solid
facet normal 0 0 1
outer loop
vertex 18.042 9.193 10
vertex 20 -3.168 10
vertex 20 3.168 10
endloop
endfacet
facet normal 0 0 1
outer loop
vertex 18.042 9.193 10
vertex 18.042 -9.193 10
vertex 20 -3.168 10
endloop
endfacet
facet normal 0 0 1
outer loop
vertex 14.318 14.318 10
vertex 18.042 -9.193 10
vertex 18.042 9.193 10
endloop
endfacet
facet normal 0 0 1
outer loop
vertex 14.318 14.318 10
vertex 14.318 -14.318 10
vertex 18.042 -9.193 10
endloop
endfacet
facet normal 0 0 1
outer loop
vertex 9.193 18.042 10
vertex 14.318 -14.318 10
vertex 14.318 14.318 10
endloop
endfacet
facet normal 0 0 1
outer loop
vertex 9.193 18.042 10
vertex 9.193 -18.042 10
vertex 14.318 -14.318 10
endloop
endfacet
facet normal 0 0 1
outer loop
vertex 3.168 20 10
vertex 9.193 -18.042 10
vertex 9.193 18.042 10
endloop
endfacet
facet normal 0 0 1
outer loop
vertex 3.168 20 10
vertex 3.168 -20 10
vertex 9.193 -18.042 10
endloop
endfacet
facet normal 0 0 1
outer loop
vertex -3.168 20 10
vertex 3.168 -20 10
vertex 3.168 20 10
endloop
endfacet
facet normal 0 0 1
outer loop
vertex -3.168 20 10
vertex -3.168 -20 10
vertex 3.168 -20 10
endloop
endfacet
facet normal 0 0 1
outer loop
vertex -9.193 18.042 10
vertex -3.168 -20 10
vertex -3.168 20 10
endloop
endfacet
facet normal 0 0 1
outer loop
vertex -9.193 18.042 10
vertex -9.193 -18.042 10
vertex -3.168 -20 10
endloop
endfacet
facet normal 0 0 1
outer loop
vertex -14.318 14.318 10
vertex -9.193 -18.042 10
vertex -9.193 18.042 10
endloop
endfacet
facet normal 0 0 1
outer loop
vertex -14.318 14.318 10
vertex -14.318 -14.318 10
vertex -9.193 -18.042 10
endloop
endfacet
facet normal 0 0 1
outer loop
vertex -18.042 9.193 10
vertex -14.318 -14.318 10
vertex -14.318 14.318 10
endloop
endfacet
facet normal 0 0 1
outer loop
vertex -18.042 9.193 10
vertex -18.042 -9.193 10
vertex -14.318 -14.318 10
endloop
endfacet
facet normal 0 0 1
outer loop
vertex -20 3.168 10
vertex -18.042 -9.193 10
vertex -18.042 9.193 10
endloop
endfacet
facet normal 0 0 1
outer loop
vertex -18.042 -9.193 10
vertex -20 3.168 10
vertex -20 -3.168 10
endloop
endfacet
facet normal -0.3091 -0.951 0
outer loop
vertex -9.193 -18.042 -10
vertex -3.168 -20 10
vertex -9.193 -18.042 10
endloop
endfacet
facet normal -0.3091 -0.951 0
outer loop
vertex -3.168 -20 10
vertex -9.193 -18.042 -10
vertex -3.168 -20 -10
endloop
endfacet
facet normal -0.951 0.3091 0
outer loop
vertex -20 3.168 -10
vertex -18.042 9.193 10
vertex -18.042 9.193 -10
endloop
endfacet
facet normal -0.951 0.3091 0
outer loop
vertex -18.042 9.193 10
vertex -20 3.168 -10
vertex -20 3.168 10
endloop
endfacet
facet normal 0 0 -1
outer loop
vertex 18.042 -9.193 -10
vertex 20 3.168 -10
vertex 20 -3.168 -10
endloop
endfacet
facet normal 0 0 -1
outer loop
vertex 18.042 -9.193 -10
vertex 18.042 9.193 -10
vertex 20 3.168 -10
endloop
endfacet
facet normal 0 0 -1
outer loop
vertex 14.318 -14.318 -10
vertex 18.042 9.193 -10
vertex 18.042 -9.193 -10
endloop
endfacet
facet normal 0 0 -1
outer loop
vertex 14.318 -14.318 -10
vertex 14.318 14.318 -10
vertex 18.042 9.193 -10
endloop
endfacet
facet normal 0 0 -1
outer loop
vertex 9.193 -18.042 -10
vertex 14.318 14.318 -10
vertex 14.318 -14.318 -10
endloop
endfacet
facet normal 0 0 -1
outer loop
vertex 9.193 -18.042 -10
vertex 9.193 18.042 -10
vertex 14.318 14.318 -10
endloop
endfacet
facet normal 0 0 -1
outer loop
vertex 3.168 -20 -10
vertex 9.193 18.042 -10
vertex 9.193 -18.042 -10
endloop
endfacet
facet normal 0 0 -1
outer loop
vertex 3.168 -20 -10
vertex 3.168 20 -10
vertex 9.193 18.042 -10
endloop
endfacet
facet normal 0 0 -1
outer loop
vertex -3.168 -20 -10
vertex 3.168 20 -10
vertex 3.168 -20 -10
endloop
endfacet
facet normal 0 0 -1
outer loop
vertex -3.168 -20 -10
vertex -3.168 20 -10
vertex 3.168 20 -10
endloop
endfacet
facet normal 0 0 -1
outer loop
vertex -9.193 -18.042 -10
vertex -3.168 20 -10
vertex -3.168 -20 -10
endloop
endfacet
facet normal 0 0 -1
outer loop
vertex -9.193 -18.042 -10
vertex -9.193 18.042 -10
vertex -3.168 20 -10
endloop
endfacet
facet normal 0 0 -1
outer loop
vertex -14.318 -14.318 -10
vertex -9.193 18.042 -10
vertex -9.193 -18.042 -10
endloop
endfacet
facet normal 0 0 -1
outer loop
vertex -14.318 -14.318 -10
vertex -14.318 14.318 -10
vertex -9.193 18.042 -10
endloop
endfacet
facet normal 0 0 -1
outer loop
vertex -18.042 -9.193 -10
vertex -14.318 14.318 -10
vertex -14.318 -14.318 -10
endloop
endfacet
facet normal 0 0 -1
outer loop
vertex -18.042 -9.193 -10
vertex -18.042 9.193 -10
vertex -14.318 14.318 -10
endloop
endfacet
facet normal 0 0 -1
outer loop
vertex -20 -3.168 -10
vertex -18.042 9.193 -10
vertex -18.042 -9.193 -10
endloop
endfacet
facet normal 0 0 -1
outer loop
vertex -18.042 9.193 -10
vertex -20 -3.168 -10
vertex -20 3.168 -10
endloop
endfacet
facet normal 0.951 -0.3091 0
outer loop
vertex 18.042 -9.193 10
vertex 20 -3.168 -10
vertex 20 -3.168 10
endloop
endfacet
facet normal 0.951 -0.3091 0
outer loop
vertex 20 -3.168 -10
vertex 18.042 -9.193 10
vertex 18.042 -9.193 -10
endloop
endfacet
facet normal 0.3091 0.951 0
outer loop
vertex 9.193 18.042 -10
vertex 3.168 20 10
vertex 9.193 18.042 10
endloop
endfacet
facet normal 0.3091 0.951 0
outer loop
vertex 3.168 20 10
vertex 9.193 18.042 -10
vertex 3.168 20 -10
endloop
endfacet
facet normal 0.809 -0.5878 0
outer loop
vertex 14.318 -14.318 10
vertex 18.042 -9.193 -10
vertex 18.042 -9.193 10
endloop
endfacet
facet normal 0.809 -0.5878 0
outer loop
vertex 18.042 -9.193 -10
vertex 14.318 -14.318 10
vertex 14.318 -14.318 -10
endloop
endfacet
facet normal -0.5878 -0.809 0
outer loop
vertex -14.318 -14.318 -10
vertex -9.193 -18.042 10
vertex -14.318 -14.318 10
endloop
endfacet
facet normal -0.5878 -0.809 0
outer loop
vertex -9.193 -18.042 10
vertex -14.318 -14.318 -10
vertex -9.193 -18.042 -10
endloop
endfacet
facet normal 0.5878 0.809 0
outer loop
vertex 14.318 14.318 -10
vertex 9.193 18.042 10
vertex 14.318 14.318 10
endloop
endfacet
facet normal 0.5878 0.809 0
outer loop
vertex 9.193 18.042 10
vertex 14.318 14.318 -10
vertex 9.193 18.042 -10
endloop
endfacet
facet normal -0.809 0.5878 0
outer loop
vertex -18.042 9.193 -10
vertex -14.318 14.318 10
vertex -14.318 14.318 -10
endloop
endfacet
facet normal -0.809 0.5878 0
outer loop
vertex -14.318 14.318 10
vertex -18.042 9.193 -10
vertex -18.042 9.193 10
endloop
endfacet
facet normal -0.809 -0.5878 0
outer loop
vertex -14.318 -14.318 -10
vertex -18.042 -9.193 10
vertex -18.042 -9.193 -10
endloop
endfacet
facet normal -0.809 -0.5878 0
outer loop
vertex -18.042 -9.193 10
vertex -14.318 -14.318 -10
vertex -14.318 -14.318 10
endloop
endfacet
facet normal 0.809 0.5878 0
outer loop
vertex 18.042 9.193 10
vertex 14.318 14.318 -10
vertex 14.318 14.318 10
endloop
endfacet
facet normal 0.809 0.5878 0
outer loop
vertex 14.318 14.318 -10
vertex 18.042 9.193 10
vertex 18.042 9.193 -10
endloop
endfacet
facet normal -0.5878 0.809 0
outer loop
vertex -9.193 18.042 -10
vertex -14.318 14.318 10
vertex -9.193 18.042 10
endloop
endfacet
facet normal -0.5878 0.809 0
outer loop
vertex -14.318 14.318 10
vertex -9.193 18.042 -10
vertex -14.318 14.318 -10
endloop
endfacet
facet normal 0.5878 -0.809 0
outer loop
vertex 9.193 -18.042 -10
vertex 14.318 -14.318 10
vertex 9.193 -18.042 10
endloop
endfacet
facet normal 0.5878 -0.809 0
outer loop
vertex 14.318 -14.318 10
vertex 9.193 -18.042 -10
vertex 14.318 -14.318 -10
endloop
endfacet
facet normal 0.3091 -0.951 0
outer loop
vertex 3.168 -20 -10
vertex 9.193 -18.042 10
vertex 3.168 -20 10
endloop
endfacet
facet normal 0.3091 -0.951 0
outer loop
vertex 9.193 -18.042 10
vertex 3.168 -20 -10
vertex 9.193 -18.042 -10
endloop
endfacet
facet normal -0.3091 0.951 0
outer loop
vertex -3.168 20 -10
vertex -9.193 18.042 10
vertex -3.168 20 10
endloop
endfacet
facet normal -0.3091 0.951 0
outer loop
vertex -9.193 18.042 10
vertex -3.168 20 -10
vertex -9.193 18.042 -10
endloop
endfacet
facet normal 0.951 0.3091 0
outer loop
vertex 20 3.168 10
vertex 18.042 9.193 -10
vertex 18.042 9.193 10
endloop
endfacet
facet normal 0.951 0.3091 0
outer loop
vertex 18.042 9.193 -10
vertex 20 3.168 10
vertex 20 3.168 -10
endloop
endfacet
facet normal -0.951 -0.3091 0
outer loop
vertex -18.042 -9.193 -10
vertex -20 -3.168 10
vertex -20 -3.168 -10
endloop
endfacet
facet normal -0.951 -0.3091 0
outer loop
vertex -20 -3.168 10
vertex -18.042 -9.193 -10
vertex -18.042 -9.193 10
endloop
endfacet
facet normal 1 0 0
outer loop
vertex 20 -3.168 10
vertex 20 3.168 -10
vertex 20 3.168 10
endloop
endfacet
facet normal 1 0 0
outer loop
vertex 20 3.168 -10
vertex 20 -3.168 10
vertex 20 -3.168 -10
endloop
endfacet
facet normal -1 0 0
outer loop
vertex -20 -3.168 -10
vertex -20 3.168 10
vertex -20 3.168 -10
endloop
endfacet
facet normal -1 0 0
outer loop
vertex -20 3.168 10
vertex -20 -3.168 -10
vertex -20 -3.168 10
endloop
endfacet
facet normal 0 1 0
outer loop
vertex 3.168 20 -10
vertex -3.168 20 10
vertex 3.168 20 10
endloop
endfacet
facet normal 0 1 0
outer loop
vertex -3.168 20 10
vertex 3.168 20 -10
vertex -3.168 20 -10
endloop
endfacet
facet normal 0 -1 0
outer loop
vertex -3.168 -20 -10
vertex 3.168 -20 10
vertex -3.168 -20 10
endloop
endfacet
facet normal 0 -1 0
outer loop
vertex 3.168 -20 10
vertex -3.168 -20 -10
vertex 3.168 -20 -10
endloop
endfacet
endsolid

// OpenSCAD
module box() {
    cube([2,2,1], center = true); 
}

module hedron(dihedral,n) {
       intersection(){
            box();
            intersection_for(i=[1:n])  { 
                rotate([dihedral, 0, 360 / n * i])  box(); 
           }
      }
}

a=$t*360;
echo(a);
scale(20) hedron(a,5);
  
  
